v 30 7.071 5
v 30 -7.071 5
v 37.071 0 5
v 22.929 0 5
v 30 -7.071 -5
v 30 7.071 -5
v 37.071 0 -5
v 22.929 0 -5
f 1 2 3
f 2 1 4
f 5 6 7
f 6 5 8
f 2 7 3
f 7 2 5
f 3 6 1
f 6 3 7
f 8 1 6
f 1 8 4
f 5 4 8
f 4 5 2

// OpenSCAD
// move location
//translate([20,0,0])
//    cube(size = 10, center = true);
    
// retate after translate
//rotate([0,0,45])
//translate([30,0,0])
//    cube(size = 10, center = true);

// retate before translate
translate([30,0,0])
rotate([0,0,45])
    cube(size = 10, center = true);
